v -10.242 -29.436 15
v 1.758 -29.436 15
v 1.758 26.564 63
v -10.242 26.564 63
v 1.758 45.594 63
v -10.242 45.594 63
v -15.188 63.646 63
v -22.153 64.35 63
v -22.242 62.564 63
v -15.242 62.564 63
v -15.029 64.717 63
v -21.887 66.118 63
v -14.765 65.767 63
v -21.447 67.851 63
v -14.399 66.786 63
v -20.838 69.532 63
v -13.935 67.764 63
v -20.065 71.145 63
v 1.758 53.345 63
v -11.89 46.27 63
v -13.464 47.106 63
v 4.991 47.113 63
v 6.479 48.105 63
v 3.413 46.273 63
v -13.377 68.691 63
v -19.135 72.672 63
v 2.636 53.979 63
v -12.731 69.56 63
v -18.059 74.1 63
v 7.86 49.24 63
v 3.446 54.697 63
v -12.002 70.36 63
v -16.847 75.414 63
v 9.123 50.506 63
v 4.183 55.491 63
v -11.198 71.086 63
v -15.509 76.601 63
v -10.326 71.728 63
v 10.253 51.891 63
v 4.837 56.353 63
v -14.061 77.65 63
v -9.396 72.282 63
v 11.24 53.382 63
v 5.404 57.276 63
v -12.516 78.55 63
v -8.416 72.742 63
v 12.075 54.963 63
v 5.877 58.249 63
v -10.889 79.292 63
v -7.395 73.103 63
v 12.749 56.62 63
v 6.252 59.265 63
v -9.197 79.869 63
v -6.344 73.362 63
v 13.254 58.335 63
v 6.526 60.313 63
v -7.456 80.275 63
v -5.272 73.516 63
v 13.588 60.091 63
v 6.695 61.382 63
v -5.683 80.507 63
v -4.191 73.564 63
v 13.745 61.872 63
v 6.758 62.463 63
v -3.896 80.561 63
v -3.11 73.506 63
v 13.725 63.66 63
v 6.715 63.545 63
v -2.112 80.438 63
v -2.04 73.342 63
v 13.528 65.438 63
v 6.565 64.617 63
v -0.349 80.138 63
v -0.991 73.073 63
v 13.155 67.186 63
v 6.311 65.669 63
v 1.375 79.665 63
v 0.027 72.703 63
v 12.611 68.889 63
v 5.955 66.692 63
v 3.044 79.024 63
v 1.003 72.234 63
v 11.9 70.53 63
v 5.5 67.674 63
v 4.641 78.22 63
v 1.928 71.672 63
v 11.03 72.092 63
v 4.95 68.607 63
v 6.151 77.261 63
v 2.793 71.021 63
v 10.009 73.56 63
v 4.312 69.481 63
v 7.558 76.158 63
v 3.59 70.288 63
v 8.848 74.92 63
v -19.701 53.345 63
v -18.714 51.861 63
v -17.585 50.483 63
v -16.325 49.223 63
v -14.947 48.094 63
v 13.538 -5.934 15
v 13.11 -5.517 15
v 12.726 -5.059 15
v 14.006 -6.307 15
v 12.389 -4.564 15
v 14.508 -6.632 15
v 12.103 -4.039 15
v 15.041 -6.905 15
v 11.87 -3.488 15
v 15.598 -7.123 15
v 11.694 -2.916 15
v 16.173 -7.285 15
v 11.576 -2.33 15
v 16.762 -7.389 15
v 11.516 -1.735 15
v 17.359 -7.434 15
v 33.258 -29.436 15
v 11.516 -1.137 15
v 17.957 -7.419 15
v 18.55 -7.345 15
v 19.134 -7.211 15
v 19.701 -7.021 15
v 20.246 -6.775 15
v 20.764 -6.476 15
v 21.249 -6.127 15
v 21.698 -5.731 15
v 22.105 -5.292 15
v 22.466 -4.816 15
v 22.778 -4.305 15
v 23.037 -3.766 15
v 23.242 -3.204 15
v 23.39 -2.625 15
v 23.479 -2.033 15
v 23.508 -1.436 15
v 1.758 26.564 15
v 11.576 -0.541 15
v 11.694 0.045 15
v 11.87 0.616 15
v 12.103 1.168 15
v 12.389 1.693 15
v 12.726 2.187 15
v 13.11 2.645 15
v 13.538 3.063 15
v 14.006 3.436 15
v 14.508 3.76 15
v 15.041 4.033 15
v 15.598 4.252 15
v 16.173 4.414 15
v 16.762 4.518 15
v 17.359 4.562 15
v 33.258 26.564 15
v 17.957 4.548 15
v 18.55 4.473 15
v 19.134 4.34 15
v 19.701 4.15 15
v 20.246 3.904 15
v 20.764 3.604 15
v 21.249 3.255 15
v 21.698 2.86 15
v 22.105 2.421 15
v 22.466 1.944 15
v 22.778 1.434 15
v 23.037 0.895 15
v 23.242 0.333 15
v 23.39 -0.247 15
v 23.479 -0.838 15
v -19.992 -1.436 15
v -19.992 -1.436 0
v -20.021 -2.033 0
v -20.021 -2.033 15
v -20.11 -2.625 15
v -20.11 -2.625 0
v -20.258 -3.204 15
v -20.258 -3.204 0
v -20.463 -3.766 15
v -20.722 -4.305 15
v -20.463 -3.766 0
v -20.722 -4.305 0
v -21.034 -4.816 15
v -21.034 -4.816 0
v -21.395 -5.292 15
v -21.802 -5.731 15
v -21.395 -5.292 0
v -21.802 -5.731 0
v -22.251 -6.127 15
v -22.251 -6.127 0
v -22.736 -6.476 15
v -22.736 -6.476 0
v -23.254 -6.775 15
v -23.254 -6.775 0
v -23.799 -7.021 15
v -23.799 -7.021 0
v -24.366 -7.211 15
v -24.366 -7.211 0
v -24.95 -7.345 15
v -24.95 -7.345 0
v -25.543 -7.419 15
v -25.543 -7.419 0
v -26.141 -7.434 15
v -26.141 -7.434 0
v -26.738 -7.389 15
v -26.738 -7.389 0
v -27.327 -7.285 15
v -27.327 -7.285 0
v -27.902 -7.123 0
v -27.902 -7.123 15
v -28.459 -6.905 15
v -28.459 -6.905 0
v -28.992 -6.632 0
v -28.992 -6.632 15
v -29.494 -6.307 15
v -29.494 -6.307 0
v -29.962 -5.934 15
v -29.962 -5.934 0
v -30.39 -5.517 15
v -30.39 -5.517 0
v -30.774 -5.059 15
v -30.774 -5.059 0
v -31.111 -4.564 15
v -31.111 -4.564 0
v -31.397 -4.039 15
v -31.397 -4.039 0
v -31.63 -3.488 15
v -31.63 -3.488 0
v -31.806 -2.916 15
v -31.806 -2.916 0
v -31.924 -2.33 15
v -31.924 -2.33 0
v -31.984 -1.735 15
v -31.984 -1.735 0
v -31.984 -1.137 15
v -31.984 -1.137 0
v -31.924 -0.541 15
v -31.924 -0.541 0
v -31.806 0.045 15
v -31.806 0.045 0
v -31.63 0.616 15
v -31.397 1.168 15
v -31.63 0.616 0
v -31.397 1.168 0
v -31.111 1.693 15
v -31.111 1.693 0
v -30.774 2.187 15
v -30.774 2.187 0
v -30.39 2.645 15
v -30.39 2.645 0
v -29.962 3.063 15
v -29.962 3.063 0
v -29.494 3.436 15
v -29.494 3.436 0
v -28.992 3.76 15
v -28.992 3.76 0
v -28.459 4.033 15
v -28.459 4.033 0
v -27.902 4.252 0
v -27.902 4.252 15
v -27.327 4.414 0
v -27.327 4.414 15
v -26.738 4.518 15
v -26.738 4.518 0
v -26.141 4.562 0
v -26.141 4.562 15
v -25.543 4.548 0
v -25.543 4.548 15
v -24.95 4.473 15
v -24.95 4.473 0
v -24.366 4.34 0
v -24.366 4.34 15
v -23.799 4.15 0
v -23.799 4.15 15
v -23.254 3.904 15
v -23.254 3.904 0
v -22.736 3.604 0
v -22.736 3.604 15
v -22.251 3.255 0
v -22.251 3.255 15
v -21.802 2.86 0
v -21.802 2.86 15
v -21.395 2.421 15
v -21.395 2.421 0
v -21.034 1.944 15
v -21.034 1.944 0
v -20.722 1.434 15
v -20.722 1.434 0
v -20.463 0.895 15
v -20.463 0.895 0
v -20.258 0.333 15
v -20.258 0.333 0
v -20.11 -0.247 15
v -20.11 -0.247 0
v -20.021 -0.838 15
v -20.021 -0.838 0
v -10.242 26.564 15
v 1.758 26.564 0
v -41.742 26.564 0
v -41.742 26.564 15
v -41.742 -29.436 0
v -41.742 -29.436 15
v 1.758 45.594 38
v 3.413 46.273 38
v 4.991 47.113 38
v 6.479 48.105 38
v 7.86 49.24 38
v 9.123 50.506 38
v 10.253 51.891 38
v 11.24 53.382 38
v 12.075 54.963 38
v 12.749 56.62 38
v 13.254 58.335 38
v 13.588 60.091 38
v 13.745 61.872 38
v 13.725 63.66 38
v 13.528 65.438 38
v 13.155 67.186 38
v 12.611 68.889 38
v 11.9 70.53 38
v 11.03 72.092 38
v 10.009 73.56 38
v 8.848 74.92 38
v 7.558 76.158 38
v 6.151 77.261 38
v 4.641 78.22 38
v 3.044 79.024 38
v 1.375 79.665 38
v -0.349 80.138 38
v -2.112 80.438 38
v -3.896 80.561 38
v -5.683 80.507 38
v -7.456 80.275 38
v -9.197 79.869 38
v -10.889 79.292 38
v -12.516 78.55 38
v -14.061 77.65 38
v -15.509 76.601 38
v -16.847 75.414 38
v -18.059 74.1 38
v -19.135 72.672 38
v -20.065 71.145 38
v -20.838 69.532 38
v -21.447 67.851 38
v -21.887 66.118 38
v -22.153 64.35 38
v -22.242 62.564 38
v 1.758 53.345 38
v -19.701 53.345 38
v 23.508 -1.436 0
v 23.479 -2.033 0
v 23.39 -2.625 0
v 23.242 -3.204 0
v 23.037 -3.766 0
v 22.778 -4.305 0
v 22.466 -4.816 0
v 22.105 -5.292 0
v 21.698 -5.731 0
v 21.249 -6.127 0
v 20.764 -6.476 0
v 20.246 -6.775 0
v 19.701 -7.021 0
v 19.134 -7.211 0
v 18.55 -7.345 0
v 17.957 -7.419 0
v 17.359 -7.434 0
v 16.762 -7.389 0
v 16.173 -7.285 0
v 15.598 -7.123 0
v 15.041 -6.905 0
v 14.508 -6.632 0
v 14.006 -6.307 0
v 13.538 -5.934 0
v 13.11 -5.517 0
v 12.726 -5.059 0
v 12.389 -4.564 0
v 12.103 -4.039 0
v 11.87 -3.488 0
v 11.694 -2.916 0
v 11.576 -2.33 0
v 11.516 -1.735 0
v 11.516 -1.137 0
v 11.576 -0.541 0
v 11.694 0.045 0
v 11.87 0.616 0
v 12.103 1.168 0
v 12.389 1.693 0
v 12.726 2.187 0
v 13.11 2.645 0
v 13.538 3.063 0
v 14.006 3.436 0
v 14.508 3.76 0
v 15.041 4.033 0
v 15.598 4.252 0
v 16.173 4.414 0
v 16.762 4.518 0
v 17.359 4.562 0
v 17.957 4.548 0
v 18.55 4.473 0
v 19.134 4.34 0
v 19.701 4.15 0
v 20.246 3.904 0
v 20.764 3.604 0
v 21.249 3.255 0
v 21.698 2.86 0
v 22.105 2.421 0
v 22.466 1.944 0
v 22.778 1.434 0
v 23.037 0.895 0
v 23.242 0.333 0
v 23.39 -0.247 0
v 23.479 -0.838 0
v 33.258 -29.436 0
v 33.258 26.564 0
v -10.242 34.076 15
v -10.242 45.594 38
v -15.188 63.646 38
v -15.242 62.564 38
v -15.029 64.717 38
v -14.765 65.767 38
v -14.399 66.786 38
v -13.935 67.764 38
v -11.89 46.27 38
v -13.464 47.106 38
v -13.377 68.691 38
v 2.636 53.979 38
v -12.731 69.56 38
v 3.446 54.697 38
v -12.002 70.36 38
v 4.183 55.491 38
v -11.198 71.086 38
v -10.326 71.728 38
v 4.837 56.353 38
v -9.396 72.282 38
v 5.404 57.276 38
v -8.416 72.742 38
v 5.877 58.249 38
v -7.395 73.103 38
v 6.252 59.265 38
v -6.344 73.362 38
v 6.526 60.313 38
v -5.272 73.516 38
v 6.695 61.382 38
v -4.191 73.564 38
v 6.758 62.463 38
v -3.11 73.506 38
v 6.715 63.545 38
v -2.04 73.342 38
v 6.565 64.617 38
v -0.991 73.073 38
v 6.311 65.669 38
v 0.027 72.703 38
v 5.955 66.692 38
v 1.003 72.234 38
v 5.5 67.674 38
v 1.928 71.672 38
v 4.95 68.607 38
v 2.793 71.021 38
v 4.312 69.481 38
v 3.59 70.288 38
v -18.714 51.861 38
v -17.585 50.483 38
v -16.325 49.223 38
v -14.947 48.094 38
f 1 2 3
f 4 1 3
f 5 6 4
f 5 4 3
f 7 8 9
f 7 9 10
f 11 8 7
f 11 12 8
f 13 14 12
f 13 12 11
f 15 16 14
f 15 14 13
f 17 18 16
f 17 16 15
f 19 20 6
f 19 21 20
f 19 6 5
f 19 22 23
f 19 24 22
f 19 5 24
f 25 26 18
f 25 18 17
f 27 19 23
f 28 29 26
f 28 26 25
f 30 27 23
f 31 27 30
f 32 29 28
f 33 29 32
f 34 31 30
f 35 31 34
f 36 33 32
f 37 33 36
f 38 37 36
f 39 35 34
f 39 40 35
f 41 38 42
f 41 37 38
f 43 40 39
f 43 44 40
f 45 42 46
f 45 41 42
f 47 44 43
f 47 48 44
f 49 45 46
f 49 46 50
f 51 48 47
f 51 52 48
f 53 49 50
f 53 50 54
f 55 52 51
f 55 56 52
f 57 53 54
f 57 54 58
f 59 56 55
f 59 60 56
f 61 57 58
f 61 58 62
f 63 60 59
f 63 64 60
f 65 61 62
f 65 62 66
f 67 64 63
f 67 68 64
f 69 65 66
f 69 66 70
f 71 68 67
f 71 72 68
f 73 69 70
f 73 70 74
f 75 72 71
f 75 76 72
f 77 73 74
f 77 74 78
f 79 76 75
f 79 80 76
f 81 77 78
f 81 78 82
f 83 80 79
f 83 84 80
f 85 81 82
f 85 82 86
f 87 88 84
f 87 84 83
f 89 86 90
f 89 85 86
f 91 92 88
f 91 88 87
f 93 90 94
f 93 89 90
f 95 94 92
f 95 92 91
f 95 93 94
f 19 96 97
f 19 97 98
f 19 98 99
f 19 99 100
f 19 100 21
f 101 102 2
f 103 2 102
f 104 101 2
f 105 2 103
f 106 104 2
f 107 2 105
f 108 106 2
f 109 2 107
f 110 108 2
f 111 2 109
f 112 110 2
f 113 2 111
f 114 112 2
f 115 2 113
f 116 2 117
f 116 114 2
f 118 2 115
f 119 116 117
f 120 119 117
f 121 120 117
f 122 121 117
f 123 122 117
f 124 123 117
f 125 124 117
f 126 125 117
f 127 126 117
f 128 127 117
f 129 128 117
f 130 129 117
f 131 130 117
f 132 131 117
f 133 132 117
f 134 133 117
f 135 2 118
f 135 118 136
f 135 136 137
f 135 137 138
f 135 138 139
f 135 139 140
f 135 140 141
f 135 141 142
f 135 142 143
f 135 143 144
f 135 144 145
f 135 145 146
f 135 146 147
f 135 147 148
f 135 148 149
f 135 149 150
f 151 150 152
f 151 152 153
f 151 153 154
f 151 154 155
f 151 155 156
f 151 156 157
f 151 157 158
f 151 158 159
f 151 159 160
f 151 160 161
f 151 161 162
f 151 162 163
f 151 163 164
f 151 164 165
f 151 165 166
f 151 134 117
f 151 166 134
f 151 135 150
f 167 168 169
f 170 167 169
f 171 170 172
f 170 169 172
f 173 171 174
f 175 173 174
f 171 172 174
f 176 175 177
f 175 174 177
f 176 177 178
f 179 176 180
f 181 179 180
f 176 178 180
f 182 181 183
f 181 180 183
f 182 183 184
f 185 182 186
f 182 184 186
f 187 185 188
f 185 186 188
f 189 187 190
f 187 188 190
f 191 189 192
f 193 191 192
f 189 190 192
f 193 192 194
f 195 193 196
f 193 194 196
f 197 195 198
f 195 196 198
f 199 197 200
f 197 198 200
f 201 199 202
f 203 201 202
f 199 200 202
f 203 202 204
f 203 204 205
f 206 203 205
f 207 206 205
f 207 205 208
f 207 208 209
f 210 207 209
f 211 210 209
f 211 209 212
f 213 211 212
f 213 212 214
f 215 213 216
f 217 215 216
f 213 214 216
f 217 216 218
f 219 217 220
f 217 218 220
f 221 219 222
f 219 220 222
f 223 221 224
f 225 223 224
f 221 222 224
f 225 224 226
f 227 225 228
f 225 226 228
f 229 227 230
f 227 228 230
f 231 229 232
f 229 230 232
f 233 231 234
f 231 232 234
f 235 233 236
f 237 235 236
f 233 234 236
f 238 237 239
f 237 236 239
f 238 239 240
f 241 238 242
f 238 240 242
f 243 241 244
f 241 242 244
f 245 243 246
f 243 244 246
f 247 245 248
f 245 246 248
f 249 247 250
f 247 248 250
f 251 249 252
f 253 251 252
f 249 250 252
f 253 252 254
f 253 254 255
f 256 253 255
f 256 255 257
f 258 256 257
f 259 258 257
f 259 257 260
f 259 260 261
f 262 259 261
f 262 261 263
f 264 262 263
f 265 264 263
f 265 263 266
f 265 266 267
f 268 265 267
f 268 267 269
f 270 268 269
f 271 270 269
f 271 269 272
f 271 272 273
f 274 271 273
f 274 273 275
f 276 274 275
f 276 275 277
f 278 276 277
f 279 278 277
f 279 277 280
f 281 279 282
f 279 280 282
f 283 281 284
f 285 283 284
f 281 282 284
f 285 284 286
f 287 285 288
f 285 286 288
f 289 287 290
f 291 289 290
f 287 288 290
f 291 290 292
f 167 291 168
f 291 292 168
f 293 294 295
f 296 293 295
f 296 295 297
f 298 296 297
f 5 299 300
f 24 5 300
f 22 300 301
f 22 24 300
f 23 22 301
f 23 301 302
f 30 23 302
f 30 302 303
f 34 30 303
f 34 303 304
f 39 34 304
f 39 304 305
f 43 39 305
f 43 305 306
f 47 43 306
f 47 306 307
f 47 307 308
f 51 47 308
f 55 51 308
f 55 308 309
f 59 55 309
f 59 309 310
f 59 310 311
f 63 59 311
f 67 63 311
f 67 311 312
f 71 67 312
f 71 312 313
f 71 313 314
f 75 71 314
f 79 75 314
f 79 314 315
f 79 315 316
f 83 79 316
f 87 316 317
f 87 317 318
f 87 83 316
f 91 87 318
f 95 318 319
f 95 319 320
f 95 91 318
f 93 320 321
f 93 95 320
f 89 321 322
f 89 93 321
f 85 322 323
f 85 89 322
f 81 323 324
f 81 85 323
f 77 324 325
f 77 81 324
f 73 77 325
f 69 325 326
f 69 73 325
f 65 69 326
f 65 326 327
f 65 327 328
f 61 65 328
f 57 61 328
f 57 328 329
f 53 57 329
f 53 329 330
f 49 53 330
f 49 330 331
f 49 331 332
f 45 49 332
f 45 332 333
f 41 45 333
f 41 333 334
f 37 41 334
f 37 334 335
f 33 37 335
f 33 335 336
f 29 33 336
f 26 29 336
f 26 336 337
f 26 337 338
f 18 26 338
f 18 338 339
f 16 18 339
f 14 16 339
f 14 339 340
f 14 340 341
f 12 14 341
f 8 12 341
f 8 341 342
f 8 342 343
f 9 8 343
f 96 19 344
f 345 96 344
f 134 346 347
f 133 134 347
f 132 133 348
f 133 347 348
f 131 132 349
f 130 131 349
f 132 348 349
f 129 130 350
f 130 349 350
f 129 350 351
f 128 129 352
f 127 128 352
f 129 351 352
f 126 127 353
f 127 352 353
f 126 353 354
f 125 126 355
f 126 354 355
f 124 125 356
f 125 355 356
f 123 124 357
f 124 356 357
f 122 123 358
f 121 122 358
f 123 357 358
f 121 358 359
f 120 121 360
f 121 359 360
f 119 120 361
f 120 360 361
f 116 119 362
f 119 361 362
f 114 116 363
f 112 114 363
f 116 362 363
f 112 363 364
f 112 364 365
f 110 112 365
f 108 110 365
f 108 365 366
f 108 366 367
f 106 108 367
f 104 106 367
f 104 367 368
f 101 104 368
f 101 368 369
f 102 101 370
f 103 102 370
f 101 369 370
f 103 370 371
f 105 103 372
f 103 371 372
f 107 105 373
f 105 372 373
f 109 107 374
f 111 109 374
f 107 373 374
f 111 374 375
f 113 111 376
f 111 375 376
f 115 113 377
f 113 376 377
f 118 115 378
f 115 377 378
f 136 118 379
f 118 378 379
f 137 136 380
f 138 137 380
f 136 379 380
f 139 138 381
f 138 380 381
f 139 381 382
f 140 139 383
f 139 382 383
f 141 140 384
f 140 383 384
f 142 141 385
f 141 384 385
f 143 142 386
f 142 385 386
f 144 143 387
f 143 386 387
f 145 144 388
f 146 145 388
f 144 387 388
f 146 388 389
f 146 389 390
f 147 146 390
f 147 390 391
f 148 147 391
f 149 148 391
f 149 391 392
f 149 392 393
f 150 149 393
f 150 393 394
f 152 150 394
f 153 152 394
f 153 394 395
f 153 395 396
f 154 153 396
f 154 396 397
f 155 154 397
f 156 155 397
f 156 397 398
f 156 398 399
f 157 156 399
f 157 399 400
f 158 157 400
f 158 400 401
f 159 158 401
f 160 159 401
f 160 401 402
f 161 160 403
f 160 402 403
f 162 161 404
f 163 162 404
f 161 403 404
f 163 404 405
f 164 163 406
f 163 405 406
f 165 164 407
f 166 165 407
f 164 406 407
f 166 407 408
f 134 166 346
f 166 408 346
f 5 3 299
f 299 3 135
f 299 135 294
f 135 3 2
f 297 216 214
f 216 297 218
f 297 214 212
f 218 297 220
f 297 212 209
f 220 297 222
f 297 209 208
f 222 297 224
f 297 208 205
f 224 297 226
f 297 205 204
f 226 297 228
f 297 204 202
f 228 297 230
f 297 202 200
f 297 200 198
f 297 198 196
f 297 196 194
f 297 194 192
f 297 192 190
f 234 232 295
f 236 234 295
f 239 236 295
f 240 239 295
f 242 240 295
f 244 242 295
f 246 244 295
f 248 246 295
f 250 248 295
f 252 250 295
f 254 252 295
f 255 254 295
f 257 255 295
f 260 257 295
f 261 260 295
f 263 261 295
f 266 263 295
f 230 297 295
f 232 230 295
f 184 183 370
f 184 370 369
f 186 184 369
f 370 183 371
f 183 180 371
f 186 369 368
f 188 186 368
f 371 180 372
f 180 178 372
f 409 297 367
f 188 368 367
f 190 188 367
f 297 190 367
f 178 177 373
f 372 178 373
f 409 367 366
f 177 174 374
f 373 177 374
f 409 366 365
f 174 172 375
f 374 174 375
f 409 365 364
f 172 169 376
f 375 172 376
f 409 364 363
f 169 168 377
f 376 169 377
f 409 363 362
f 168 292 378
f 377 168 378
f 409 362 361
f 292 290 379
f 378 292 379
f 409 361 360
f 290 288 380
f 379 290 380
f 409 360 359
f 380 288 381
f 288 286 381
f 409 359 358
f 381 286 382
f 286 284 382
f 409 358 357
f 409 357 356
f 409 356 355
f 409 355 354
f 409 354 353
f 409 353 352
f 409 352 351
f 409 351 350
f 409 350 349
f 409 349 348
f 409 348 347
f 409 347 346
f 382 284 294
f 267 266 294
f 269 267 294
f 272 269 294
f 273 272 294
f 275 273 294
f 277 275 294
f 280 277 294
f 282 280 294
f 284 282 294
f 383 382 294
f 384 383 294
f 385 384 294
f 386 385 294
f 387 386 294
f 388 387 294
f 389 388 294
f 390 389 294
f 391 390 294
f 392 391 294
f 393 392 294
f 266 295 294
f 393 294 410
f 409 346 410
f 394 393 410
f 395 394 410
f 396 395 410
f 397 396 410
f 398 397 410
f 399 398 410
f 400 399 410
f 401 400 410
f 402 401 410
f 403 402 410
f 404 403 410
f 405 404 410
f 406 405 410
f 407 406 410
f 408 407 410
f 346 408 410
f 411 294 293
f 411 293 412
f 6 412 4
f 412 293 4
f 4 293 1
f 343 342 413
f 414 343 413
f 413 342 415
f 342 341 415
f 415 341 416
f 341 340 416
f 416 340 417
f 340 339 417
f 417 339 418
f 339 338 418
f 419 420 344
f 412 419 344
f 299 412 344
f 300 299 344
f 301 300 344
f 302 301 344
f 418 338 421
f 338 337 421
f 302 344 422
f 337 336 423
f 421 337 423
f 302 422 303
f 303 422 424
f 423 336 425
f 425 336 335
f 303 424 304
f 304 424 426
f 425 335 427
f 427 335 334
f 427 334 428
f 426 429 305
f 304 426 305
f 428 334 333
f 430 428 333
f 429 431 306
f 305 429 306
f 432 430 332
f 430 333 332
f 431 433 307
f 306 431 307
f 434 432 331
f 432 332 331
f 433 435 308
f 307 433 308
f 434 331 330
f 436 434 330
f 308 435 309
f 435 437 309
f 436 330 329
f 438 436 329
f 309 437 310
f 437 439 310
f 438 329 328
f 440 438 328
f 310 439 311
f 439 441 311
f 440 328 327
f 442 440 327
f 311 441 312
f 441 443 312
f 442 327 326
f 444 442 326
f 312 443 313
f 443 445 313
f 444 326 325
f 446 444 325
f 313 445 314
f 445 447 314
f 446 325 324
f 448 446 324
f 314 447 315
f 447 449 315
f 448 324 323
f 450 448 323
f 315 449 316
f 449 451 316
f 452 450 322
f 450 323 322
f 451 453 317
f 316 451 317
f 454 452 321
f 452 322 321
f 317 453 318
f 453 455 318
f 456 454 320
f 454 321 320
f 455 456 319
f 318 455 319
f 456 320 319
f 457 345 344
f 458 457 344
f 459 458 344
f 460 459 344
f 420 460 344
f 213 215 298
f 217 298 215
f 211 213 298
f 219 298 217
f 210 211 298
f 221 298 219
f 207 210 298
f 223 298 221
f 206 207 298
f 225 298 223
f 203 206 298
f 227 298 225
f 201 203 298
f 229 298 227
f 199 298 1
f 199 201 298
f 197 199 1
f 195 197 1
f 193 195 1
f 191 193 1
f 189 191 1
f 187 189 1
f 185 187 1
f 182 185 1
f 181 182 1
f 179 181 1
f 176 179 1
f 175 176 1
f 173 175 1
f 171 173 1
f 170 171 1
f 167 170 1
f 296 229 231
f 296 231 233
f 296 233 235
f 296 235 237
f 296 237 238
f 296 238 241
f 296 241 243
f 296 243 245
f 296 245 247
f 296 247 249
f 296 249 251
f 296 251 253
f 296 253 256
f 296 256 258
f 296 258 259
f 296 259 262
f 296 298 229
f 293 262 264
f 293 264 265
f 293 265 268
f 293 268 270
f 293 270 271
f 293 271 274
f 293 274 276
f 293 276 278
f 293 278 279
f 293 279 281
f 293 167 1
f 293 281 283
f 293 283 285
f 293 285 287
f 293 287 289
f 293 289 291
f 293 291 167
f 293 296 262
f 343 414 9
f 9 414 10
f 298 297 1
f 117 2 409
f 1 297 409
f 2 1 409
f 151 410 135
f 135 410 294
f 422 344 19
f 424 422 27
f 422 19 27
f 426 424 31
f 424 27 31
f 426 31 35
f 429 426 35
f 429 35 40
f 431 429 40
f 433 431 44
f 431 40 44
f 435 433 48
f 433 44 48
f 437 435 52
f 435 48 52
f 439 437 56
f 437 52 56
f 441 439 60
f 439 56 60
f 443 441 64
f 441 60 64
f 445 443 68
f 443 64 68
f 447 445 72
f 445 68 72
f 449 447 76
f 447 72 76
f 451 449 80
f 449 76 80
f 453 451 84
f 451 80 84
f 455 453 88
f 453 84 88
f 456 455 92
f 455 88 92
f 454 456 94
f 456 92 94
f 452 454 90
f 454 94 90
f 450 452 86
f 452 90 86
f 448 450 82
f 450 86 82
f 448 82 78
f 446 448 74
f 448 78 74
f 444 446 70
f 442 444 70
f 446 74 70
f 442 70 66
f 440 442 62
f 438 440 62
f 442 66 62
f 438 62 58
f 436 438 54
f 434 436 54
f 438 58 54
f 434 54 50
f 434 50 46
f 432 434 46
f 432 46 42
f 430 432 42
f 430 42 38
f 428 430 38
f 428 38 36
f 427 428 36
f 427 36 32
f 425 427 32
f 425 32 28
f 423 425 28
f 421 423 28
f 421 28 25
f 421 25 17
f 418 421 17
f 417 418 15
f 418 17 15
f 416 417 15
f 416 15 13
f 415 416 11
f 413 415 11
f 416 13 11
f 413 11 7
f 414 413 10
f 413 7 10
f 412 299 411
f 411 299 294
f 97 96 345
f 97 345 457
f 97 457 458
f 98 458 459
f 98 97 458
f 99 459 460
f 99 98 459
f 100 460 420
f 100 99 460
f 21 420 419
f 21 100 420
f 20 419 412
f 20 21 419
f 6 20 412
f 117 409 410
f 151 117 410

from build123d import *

# Parameters (mm, degrees)
F1_DEPTH  = 15
F2_W      = 12
F2_H      = 56
F3_DEPTH  = 48
F5_DEPTH  = 25
F7_DEPTH  = 36
F8_R      = 18
F8_R_2    = 11
F9_DEPTH  = 25
F11_DEPTH = 25


with BuildPart() as f1:
    # F0 (on Top) → F1 (new body)
    with BuildSketch(Plane.XY):
        with BuildLine():
            Line((-10.2415060103, 26.5643188208), (-41.7415060103, 26.5643188208))
            Line((-41.7415060103, 26.5643188208), (-41.7415060103, -1.4356811792))
            Line((-41.7415060103, -1.4356811792), (-31.9915060103, -1.4356811792))
            ThreePointArc((-31.9915060103, -1.4356811792), (-25.9915060103, 4.5643188208), (-19.9915060103, -1.4356811792))
            Line((-19.9915060103, -1.4356811792), (-10.2415060103, -1.4356811792))
            Line((-10.2415060103, -1.4356811792), (-10.2415060103, 26.5643188208))
        make_face()
        Polygon((1.7584939897, 26.5643188208), (-10.2415060103, 26.5643188208), (-10.2415060103, -1.4356811792), (-10.2415060103, -29.4356811792), (-4.2415060103, -29.4356811792), (1.7584939897, -29.4356811792), (1.7584939897, -1.4356811792), align=None)
        with BuildLine():
            Line((-31.9915060103, -1.4356811792), (-41.7415060103, -1.4356811792))
            Line((-41.7415060103, -1.4356811792), (-41.7415060103, -29.4356811792))
            Line((-41.7415060103, -29.4356811792), (-10.2415060103, -29.4356811792))
            Line((-10.2415060103, -29.4356811792), (-10.2415060103, -1.4356811792))
            Line((-10.2415060103, -1.4356811792), (-19.9915060103, -1.4356811792))
            ThreePointArc((-19.9915060103, -1.4356811792), (-25.9915060103, -7.4356811792), (-31.9915060103, -1.4356811792))
        make_face()
        with BuildLine():
            Line((33.2584939897, 26.5643188208), (1.7584939897, 26.5643188208))
            Line((1.7584939897, 26.5643188208), (1.7584939897, -1.4356811792))
            Line((1.7584939897, -1.4356811792), (11.5084939897, -1.4356811792))
            ThreePointArc((11.5084939897, -1.4356811792), (17.5084939897, 4.5643188208), (23.5084939897, -1.4356811792))
            Line((23.5084939897, -1.4356811792), (33.2584939897, -1.4356811792))
            Line((33.2584939897, -1.4356811792), (33.2584939897, 26.5643188208))
        make_face()
        with BuildLine():
            Line((11.5084939897, -1.4356811792), (1.7584939897, -1.4356811792))
            Line((1.7584939897, -1.4356811792), (1.7584939897, -29.4356811792))
            Line((1.7584939897, -29.4356811792), (33.2584939897, -29.4356811792))
            Line((33.2584939897, -29.4356811792), (33.2584939897, -1.4356811792))
            Line((33.2584939897, -1.4356811792), (23.5084939897, -1.4356811792))
            ThreePointArc((23.5084939897, -1.4356811792), (17.5084939897, -7.4356811792), (11.5084939897, -1.4356811792))
        make_face()
    extrude(amount=F1_DEPTH)

    # F2 (on face) → F3 (join)
    with BuildSketch(Plane.XY.offset(15)):
        with Locations((-4.2415060103, -1.4356811792)):
            Rectangle(F2_W, F2_H)
    extrude(amount=F3_DEPTH)

    # F4 (on face) → F5 (cut)
    with BuildSketch(Plane.YZ.offset(1.7584939897)):
        Polygon((-29.4356811792, 15), (26.5643188208, 63), (-29.4356811792, 63), align=None)
    extrude(amount=-F5_DEPTH, mode=Mode.SUBTRACT)

    # F6 (on face) → F7 (join)
    with BuildSketch(Plane(origin=(0, 26.5643188208, 0), x_dir=(-1, 0, 0), z_dir=(0, 1, 0))):
        Polygon((-1.7584939897, 63), (-1.7584939897, 15), (-1.7584939897, 0), (10.2415060103, 15), (10.2415060103, 63), align=None)
    extrude(amount=F7_DEPTH)

    # F8 (on face) → F9 (join)
    with BuildSketch(Plane.XY.offset(63)):
        with Locations((-4.2415060103, 62.5643188208)):
            Circle(F8_R)
        with Locations((-4.2415060103, 62.5643188208)):
            Circle(F8_R_2, mode=Mode.SUBTRACT)
    extrude(amount=-F9_DEPTH)

    # F10 (on face) → F11 (cut)
    with BuildSketch(Plane.YZ.offset(1.7584939897)):
        Polygon((45.5937560724, 38), (26.5643188208, 0), (62.5643188208, 0), (62.5643188208, 63), (53.3447743635, 63), (53.3447743635, 38), align=None)
    extrude(amount=-F11_DEPTH, mode=Mode.SUBTRACT)


solid = f1.part
